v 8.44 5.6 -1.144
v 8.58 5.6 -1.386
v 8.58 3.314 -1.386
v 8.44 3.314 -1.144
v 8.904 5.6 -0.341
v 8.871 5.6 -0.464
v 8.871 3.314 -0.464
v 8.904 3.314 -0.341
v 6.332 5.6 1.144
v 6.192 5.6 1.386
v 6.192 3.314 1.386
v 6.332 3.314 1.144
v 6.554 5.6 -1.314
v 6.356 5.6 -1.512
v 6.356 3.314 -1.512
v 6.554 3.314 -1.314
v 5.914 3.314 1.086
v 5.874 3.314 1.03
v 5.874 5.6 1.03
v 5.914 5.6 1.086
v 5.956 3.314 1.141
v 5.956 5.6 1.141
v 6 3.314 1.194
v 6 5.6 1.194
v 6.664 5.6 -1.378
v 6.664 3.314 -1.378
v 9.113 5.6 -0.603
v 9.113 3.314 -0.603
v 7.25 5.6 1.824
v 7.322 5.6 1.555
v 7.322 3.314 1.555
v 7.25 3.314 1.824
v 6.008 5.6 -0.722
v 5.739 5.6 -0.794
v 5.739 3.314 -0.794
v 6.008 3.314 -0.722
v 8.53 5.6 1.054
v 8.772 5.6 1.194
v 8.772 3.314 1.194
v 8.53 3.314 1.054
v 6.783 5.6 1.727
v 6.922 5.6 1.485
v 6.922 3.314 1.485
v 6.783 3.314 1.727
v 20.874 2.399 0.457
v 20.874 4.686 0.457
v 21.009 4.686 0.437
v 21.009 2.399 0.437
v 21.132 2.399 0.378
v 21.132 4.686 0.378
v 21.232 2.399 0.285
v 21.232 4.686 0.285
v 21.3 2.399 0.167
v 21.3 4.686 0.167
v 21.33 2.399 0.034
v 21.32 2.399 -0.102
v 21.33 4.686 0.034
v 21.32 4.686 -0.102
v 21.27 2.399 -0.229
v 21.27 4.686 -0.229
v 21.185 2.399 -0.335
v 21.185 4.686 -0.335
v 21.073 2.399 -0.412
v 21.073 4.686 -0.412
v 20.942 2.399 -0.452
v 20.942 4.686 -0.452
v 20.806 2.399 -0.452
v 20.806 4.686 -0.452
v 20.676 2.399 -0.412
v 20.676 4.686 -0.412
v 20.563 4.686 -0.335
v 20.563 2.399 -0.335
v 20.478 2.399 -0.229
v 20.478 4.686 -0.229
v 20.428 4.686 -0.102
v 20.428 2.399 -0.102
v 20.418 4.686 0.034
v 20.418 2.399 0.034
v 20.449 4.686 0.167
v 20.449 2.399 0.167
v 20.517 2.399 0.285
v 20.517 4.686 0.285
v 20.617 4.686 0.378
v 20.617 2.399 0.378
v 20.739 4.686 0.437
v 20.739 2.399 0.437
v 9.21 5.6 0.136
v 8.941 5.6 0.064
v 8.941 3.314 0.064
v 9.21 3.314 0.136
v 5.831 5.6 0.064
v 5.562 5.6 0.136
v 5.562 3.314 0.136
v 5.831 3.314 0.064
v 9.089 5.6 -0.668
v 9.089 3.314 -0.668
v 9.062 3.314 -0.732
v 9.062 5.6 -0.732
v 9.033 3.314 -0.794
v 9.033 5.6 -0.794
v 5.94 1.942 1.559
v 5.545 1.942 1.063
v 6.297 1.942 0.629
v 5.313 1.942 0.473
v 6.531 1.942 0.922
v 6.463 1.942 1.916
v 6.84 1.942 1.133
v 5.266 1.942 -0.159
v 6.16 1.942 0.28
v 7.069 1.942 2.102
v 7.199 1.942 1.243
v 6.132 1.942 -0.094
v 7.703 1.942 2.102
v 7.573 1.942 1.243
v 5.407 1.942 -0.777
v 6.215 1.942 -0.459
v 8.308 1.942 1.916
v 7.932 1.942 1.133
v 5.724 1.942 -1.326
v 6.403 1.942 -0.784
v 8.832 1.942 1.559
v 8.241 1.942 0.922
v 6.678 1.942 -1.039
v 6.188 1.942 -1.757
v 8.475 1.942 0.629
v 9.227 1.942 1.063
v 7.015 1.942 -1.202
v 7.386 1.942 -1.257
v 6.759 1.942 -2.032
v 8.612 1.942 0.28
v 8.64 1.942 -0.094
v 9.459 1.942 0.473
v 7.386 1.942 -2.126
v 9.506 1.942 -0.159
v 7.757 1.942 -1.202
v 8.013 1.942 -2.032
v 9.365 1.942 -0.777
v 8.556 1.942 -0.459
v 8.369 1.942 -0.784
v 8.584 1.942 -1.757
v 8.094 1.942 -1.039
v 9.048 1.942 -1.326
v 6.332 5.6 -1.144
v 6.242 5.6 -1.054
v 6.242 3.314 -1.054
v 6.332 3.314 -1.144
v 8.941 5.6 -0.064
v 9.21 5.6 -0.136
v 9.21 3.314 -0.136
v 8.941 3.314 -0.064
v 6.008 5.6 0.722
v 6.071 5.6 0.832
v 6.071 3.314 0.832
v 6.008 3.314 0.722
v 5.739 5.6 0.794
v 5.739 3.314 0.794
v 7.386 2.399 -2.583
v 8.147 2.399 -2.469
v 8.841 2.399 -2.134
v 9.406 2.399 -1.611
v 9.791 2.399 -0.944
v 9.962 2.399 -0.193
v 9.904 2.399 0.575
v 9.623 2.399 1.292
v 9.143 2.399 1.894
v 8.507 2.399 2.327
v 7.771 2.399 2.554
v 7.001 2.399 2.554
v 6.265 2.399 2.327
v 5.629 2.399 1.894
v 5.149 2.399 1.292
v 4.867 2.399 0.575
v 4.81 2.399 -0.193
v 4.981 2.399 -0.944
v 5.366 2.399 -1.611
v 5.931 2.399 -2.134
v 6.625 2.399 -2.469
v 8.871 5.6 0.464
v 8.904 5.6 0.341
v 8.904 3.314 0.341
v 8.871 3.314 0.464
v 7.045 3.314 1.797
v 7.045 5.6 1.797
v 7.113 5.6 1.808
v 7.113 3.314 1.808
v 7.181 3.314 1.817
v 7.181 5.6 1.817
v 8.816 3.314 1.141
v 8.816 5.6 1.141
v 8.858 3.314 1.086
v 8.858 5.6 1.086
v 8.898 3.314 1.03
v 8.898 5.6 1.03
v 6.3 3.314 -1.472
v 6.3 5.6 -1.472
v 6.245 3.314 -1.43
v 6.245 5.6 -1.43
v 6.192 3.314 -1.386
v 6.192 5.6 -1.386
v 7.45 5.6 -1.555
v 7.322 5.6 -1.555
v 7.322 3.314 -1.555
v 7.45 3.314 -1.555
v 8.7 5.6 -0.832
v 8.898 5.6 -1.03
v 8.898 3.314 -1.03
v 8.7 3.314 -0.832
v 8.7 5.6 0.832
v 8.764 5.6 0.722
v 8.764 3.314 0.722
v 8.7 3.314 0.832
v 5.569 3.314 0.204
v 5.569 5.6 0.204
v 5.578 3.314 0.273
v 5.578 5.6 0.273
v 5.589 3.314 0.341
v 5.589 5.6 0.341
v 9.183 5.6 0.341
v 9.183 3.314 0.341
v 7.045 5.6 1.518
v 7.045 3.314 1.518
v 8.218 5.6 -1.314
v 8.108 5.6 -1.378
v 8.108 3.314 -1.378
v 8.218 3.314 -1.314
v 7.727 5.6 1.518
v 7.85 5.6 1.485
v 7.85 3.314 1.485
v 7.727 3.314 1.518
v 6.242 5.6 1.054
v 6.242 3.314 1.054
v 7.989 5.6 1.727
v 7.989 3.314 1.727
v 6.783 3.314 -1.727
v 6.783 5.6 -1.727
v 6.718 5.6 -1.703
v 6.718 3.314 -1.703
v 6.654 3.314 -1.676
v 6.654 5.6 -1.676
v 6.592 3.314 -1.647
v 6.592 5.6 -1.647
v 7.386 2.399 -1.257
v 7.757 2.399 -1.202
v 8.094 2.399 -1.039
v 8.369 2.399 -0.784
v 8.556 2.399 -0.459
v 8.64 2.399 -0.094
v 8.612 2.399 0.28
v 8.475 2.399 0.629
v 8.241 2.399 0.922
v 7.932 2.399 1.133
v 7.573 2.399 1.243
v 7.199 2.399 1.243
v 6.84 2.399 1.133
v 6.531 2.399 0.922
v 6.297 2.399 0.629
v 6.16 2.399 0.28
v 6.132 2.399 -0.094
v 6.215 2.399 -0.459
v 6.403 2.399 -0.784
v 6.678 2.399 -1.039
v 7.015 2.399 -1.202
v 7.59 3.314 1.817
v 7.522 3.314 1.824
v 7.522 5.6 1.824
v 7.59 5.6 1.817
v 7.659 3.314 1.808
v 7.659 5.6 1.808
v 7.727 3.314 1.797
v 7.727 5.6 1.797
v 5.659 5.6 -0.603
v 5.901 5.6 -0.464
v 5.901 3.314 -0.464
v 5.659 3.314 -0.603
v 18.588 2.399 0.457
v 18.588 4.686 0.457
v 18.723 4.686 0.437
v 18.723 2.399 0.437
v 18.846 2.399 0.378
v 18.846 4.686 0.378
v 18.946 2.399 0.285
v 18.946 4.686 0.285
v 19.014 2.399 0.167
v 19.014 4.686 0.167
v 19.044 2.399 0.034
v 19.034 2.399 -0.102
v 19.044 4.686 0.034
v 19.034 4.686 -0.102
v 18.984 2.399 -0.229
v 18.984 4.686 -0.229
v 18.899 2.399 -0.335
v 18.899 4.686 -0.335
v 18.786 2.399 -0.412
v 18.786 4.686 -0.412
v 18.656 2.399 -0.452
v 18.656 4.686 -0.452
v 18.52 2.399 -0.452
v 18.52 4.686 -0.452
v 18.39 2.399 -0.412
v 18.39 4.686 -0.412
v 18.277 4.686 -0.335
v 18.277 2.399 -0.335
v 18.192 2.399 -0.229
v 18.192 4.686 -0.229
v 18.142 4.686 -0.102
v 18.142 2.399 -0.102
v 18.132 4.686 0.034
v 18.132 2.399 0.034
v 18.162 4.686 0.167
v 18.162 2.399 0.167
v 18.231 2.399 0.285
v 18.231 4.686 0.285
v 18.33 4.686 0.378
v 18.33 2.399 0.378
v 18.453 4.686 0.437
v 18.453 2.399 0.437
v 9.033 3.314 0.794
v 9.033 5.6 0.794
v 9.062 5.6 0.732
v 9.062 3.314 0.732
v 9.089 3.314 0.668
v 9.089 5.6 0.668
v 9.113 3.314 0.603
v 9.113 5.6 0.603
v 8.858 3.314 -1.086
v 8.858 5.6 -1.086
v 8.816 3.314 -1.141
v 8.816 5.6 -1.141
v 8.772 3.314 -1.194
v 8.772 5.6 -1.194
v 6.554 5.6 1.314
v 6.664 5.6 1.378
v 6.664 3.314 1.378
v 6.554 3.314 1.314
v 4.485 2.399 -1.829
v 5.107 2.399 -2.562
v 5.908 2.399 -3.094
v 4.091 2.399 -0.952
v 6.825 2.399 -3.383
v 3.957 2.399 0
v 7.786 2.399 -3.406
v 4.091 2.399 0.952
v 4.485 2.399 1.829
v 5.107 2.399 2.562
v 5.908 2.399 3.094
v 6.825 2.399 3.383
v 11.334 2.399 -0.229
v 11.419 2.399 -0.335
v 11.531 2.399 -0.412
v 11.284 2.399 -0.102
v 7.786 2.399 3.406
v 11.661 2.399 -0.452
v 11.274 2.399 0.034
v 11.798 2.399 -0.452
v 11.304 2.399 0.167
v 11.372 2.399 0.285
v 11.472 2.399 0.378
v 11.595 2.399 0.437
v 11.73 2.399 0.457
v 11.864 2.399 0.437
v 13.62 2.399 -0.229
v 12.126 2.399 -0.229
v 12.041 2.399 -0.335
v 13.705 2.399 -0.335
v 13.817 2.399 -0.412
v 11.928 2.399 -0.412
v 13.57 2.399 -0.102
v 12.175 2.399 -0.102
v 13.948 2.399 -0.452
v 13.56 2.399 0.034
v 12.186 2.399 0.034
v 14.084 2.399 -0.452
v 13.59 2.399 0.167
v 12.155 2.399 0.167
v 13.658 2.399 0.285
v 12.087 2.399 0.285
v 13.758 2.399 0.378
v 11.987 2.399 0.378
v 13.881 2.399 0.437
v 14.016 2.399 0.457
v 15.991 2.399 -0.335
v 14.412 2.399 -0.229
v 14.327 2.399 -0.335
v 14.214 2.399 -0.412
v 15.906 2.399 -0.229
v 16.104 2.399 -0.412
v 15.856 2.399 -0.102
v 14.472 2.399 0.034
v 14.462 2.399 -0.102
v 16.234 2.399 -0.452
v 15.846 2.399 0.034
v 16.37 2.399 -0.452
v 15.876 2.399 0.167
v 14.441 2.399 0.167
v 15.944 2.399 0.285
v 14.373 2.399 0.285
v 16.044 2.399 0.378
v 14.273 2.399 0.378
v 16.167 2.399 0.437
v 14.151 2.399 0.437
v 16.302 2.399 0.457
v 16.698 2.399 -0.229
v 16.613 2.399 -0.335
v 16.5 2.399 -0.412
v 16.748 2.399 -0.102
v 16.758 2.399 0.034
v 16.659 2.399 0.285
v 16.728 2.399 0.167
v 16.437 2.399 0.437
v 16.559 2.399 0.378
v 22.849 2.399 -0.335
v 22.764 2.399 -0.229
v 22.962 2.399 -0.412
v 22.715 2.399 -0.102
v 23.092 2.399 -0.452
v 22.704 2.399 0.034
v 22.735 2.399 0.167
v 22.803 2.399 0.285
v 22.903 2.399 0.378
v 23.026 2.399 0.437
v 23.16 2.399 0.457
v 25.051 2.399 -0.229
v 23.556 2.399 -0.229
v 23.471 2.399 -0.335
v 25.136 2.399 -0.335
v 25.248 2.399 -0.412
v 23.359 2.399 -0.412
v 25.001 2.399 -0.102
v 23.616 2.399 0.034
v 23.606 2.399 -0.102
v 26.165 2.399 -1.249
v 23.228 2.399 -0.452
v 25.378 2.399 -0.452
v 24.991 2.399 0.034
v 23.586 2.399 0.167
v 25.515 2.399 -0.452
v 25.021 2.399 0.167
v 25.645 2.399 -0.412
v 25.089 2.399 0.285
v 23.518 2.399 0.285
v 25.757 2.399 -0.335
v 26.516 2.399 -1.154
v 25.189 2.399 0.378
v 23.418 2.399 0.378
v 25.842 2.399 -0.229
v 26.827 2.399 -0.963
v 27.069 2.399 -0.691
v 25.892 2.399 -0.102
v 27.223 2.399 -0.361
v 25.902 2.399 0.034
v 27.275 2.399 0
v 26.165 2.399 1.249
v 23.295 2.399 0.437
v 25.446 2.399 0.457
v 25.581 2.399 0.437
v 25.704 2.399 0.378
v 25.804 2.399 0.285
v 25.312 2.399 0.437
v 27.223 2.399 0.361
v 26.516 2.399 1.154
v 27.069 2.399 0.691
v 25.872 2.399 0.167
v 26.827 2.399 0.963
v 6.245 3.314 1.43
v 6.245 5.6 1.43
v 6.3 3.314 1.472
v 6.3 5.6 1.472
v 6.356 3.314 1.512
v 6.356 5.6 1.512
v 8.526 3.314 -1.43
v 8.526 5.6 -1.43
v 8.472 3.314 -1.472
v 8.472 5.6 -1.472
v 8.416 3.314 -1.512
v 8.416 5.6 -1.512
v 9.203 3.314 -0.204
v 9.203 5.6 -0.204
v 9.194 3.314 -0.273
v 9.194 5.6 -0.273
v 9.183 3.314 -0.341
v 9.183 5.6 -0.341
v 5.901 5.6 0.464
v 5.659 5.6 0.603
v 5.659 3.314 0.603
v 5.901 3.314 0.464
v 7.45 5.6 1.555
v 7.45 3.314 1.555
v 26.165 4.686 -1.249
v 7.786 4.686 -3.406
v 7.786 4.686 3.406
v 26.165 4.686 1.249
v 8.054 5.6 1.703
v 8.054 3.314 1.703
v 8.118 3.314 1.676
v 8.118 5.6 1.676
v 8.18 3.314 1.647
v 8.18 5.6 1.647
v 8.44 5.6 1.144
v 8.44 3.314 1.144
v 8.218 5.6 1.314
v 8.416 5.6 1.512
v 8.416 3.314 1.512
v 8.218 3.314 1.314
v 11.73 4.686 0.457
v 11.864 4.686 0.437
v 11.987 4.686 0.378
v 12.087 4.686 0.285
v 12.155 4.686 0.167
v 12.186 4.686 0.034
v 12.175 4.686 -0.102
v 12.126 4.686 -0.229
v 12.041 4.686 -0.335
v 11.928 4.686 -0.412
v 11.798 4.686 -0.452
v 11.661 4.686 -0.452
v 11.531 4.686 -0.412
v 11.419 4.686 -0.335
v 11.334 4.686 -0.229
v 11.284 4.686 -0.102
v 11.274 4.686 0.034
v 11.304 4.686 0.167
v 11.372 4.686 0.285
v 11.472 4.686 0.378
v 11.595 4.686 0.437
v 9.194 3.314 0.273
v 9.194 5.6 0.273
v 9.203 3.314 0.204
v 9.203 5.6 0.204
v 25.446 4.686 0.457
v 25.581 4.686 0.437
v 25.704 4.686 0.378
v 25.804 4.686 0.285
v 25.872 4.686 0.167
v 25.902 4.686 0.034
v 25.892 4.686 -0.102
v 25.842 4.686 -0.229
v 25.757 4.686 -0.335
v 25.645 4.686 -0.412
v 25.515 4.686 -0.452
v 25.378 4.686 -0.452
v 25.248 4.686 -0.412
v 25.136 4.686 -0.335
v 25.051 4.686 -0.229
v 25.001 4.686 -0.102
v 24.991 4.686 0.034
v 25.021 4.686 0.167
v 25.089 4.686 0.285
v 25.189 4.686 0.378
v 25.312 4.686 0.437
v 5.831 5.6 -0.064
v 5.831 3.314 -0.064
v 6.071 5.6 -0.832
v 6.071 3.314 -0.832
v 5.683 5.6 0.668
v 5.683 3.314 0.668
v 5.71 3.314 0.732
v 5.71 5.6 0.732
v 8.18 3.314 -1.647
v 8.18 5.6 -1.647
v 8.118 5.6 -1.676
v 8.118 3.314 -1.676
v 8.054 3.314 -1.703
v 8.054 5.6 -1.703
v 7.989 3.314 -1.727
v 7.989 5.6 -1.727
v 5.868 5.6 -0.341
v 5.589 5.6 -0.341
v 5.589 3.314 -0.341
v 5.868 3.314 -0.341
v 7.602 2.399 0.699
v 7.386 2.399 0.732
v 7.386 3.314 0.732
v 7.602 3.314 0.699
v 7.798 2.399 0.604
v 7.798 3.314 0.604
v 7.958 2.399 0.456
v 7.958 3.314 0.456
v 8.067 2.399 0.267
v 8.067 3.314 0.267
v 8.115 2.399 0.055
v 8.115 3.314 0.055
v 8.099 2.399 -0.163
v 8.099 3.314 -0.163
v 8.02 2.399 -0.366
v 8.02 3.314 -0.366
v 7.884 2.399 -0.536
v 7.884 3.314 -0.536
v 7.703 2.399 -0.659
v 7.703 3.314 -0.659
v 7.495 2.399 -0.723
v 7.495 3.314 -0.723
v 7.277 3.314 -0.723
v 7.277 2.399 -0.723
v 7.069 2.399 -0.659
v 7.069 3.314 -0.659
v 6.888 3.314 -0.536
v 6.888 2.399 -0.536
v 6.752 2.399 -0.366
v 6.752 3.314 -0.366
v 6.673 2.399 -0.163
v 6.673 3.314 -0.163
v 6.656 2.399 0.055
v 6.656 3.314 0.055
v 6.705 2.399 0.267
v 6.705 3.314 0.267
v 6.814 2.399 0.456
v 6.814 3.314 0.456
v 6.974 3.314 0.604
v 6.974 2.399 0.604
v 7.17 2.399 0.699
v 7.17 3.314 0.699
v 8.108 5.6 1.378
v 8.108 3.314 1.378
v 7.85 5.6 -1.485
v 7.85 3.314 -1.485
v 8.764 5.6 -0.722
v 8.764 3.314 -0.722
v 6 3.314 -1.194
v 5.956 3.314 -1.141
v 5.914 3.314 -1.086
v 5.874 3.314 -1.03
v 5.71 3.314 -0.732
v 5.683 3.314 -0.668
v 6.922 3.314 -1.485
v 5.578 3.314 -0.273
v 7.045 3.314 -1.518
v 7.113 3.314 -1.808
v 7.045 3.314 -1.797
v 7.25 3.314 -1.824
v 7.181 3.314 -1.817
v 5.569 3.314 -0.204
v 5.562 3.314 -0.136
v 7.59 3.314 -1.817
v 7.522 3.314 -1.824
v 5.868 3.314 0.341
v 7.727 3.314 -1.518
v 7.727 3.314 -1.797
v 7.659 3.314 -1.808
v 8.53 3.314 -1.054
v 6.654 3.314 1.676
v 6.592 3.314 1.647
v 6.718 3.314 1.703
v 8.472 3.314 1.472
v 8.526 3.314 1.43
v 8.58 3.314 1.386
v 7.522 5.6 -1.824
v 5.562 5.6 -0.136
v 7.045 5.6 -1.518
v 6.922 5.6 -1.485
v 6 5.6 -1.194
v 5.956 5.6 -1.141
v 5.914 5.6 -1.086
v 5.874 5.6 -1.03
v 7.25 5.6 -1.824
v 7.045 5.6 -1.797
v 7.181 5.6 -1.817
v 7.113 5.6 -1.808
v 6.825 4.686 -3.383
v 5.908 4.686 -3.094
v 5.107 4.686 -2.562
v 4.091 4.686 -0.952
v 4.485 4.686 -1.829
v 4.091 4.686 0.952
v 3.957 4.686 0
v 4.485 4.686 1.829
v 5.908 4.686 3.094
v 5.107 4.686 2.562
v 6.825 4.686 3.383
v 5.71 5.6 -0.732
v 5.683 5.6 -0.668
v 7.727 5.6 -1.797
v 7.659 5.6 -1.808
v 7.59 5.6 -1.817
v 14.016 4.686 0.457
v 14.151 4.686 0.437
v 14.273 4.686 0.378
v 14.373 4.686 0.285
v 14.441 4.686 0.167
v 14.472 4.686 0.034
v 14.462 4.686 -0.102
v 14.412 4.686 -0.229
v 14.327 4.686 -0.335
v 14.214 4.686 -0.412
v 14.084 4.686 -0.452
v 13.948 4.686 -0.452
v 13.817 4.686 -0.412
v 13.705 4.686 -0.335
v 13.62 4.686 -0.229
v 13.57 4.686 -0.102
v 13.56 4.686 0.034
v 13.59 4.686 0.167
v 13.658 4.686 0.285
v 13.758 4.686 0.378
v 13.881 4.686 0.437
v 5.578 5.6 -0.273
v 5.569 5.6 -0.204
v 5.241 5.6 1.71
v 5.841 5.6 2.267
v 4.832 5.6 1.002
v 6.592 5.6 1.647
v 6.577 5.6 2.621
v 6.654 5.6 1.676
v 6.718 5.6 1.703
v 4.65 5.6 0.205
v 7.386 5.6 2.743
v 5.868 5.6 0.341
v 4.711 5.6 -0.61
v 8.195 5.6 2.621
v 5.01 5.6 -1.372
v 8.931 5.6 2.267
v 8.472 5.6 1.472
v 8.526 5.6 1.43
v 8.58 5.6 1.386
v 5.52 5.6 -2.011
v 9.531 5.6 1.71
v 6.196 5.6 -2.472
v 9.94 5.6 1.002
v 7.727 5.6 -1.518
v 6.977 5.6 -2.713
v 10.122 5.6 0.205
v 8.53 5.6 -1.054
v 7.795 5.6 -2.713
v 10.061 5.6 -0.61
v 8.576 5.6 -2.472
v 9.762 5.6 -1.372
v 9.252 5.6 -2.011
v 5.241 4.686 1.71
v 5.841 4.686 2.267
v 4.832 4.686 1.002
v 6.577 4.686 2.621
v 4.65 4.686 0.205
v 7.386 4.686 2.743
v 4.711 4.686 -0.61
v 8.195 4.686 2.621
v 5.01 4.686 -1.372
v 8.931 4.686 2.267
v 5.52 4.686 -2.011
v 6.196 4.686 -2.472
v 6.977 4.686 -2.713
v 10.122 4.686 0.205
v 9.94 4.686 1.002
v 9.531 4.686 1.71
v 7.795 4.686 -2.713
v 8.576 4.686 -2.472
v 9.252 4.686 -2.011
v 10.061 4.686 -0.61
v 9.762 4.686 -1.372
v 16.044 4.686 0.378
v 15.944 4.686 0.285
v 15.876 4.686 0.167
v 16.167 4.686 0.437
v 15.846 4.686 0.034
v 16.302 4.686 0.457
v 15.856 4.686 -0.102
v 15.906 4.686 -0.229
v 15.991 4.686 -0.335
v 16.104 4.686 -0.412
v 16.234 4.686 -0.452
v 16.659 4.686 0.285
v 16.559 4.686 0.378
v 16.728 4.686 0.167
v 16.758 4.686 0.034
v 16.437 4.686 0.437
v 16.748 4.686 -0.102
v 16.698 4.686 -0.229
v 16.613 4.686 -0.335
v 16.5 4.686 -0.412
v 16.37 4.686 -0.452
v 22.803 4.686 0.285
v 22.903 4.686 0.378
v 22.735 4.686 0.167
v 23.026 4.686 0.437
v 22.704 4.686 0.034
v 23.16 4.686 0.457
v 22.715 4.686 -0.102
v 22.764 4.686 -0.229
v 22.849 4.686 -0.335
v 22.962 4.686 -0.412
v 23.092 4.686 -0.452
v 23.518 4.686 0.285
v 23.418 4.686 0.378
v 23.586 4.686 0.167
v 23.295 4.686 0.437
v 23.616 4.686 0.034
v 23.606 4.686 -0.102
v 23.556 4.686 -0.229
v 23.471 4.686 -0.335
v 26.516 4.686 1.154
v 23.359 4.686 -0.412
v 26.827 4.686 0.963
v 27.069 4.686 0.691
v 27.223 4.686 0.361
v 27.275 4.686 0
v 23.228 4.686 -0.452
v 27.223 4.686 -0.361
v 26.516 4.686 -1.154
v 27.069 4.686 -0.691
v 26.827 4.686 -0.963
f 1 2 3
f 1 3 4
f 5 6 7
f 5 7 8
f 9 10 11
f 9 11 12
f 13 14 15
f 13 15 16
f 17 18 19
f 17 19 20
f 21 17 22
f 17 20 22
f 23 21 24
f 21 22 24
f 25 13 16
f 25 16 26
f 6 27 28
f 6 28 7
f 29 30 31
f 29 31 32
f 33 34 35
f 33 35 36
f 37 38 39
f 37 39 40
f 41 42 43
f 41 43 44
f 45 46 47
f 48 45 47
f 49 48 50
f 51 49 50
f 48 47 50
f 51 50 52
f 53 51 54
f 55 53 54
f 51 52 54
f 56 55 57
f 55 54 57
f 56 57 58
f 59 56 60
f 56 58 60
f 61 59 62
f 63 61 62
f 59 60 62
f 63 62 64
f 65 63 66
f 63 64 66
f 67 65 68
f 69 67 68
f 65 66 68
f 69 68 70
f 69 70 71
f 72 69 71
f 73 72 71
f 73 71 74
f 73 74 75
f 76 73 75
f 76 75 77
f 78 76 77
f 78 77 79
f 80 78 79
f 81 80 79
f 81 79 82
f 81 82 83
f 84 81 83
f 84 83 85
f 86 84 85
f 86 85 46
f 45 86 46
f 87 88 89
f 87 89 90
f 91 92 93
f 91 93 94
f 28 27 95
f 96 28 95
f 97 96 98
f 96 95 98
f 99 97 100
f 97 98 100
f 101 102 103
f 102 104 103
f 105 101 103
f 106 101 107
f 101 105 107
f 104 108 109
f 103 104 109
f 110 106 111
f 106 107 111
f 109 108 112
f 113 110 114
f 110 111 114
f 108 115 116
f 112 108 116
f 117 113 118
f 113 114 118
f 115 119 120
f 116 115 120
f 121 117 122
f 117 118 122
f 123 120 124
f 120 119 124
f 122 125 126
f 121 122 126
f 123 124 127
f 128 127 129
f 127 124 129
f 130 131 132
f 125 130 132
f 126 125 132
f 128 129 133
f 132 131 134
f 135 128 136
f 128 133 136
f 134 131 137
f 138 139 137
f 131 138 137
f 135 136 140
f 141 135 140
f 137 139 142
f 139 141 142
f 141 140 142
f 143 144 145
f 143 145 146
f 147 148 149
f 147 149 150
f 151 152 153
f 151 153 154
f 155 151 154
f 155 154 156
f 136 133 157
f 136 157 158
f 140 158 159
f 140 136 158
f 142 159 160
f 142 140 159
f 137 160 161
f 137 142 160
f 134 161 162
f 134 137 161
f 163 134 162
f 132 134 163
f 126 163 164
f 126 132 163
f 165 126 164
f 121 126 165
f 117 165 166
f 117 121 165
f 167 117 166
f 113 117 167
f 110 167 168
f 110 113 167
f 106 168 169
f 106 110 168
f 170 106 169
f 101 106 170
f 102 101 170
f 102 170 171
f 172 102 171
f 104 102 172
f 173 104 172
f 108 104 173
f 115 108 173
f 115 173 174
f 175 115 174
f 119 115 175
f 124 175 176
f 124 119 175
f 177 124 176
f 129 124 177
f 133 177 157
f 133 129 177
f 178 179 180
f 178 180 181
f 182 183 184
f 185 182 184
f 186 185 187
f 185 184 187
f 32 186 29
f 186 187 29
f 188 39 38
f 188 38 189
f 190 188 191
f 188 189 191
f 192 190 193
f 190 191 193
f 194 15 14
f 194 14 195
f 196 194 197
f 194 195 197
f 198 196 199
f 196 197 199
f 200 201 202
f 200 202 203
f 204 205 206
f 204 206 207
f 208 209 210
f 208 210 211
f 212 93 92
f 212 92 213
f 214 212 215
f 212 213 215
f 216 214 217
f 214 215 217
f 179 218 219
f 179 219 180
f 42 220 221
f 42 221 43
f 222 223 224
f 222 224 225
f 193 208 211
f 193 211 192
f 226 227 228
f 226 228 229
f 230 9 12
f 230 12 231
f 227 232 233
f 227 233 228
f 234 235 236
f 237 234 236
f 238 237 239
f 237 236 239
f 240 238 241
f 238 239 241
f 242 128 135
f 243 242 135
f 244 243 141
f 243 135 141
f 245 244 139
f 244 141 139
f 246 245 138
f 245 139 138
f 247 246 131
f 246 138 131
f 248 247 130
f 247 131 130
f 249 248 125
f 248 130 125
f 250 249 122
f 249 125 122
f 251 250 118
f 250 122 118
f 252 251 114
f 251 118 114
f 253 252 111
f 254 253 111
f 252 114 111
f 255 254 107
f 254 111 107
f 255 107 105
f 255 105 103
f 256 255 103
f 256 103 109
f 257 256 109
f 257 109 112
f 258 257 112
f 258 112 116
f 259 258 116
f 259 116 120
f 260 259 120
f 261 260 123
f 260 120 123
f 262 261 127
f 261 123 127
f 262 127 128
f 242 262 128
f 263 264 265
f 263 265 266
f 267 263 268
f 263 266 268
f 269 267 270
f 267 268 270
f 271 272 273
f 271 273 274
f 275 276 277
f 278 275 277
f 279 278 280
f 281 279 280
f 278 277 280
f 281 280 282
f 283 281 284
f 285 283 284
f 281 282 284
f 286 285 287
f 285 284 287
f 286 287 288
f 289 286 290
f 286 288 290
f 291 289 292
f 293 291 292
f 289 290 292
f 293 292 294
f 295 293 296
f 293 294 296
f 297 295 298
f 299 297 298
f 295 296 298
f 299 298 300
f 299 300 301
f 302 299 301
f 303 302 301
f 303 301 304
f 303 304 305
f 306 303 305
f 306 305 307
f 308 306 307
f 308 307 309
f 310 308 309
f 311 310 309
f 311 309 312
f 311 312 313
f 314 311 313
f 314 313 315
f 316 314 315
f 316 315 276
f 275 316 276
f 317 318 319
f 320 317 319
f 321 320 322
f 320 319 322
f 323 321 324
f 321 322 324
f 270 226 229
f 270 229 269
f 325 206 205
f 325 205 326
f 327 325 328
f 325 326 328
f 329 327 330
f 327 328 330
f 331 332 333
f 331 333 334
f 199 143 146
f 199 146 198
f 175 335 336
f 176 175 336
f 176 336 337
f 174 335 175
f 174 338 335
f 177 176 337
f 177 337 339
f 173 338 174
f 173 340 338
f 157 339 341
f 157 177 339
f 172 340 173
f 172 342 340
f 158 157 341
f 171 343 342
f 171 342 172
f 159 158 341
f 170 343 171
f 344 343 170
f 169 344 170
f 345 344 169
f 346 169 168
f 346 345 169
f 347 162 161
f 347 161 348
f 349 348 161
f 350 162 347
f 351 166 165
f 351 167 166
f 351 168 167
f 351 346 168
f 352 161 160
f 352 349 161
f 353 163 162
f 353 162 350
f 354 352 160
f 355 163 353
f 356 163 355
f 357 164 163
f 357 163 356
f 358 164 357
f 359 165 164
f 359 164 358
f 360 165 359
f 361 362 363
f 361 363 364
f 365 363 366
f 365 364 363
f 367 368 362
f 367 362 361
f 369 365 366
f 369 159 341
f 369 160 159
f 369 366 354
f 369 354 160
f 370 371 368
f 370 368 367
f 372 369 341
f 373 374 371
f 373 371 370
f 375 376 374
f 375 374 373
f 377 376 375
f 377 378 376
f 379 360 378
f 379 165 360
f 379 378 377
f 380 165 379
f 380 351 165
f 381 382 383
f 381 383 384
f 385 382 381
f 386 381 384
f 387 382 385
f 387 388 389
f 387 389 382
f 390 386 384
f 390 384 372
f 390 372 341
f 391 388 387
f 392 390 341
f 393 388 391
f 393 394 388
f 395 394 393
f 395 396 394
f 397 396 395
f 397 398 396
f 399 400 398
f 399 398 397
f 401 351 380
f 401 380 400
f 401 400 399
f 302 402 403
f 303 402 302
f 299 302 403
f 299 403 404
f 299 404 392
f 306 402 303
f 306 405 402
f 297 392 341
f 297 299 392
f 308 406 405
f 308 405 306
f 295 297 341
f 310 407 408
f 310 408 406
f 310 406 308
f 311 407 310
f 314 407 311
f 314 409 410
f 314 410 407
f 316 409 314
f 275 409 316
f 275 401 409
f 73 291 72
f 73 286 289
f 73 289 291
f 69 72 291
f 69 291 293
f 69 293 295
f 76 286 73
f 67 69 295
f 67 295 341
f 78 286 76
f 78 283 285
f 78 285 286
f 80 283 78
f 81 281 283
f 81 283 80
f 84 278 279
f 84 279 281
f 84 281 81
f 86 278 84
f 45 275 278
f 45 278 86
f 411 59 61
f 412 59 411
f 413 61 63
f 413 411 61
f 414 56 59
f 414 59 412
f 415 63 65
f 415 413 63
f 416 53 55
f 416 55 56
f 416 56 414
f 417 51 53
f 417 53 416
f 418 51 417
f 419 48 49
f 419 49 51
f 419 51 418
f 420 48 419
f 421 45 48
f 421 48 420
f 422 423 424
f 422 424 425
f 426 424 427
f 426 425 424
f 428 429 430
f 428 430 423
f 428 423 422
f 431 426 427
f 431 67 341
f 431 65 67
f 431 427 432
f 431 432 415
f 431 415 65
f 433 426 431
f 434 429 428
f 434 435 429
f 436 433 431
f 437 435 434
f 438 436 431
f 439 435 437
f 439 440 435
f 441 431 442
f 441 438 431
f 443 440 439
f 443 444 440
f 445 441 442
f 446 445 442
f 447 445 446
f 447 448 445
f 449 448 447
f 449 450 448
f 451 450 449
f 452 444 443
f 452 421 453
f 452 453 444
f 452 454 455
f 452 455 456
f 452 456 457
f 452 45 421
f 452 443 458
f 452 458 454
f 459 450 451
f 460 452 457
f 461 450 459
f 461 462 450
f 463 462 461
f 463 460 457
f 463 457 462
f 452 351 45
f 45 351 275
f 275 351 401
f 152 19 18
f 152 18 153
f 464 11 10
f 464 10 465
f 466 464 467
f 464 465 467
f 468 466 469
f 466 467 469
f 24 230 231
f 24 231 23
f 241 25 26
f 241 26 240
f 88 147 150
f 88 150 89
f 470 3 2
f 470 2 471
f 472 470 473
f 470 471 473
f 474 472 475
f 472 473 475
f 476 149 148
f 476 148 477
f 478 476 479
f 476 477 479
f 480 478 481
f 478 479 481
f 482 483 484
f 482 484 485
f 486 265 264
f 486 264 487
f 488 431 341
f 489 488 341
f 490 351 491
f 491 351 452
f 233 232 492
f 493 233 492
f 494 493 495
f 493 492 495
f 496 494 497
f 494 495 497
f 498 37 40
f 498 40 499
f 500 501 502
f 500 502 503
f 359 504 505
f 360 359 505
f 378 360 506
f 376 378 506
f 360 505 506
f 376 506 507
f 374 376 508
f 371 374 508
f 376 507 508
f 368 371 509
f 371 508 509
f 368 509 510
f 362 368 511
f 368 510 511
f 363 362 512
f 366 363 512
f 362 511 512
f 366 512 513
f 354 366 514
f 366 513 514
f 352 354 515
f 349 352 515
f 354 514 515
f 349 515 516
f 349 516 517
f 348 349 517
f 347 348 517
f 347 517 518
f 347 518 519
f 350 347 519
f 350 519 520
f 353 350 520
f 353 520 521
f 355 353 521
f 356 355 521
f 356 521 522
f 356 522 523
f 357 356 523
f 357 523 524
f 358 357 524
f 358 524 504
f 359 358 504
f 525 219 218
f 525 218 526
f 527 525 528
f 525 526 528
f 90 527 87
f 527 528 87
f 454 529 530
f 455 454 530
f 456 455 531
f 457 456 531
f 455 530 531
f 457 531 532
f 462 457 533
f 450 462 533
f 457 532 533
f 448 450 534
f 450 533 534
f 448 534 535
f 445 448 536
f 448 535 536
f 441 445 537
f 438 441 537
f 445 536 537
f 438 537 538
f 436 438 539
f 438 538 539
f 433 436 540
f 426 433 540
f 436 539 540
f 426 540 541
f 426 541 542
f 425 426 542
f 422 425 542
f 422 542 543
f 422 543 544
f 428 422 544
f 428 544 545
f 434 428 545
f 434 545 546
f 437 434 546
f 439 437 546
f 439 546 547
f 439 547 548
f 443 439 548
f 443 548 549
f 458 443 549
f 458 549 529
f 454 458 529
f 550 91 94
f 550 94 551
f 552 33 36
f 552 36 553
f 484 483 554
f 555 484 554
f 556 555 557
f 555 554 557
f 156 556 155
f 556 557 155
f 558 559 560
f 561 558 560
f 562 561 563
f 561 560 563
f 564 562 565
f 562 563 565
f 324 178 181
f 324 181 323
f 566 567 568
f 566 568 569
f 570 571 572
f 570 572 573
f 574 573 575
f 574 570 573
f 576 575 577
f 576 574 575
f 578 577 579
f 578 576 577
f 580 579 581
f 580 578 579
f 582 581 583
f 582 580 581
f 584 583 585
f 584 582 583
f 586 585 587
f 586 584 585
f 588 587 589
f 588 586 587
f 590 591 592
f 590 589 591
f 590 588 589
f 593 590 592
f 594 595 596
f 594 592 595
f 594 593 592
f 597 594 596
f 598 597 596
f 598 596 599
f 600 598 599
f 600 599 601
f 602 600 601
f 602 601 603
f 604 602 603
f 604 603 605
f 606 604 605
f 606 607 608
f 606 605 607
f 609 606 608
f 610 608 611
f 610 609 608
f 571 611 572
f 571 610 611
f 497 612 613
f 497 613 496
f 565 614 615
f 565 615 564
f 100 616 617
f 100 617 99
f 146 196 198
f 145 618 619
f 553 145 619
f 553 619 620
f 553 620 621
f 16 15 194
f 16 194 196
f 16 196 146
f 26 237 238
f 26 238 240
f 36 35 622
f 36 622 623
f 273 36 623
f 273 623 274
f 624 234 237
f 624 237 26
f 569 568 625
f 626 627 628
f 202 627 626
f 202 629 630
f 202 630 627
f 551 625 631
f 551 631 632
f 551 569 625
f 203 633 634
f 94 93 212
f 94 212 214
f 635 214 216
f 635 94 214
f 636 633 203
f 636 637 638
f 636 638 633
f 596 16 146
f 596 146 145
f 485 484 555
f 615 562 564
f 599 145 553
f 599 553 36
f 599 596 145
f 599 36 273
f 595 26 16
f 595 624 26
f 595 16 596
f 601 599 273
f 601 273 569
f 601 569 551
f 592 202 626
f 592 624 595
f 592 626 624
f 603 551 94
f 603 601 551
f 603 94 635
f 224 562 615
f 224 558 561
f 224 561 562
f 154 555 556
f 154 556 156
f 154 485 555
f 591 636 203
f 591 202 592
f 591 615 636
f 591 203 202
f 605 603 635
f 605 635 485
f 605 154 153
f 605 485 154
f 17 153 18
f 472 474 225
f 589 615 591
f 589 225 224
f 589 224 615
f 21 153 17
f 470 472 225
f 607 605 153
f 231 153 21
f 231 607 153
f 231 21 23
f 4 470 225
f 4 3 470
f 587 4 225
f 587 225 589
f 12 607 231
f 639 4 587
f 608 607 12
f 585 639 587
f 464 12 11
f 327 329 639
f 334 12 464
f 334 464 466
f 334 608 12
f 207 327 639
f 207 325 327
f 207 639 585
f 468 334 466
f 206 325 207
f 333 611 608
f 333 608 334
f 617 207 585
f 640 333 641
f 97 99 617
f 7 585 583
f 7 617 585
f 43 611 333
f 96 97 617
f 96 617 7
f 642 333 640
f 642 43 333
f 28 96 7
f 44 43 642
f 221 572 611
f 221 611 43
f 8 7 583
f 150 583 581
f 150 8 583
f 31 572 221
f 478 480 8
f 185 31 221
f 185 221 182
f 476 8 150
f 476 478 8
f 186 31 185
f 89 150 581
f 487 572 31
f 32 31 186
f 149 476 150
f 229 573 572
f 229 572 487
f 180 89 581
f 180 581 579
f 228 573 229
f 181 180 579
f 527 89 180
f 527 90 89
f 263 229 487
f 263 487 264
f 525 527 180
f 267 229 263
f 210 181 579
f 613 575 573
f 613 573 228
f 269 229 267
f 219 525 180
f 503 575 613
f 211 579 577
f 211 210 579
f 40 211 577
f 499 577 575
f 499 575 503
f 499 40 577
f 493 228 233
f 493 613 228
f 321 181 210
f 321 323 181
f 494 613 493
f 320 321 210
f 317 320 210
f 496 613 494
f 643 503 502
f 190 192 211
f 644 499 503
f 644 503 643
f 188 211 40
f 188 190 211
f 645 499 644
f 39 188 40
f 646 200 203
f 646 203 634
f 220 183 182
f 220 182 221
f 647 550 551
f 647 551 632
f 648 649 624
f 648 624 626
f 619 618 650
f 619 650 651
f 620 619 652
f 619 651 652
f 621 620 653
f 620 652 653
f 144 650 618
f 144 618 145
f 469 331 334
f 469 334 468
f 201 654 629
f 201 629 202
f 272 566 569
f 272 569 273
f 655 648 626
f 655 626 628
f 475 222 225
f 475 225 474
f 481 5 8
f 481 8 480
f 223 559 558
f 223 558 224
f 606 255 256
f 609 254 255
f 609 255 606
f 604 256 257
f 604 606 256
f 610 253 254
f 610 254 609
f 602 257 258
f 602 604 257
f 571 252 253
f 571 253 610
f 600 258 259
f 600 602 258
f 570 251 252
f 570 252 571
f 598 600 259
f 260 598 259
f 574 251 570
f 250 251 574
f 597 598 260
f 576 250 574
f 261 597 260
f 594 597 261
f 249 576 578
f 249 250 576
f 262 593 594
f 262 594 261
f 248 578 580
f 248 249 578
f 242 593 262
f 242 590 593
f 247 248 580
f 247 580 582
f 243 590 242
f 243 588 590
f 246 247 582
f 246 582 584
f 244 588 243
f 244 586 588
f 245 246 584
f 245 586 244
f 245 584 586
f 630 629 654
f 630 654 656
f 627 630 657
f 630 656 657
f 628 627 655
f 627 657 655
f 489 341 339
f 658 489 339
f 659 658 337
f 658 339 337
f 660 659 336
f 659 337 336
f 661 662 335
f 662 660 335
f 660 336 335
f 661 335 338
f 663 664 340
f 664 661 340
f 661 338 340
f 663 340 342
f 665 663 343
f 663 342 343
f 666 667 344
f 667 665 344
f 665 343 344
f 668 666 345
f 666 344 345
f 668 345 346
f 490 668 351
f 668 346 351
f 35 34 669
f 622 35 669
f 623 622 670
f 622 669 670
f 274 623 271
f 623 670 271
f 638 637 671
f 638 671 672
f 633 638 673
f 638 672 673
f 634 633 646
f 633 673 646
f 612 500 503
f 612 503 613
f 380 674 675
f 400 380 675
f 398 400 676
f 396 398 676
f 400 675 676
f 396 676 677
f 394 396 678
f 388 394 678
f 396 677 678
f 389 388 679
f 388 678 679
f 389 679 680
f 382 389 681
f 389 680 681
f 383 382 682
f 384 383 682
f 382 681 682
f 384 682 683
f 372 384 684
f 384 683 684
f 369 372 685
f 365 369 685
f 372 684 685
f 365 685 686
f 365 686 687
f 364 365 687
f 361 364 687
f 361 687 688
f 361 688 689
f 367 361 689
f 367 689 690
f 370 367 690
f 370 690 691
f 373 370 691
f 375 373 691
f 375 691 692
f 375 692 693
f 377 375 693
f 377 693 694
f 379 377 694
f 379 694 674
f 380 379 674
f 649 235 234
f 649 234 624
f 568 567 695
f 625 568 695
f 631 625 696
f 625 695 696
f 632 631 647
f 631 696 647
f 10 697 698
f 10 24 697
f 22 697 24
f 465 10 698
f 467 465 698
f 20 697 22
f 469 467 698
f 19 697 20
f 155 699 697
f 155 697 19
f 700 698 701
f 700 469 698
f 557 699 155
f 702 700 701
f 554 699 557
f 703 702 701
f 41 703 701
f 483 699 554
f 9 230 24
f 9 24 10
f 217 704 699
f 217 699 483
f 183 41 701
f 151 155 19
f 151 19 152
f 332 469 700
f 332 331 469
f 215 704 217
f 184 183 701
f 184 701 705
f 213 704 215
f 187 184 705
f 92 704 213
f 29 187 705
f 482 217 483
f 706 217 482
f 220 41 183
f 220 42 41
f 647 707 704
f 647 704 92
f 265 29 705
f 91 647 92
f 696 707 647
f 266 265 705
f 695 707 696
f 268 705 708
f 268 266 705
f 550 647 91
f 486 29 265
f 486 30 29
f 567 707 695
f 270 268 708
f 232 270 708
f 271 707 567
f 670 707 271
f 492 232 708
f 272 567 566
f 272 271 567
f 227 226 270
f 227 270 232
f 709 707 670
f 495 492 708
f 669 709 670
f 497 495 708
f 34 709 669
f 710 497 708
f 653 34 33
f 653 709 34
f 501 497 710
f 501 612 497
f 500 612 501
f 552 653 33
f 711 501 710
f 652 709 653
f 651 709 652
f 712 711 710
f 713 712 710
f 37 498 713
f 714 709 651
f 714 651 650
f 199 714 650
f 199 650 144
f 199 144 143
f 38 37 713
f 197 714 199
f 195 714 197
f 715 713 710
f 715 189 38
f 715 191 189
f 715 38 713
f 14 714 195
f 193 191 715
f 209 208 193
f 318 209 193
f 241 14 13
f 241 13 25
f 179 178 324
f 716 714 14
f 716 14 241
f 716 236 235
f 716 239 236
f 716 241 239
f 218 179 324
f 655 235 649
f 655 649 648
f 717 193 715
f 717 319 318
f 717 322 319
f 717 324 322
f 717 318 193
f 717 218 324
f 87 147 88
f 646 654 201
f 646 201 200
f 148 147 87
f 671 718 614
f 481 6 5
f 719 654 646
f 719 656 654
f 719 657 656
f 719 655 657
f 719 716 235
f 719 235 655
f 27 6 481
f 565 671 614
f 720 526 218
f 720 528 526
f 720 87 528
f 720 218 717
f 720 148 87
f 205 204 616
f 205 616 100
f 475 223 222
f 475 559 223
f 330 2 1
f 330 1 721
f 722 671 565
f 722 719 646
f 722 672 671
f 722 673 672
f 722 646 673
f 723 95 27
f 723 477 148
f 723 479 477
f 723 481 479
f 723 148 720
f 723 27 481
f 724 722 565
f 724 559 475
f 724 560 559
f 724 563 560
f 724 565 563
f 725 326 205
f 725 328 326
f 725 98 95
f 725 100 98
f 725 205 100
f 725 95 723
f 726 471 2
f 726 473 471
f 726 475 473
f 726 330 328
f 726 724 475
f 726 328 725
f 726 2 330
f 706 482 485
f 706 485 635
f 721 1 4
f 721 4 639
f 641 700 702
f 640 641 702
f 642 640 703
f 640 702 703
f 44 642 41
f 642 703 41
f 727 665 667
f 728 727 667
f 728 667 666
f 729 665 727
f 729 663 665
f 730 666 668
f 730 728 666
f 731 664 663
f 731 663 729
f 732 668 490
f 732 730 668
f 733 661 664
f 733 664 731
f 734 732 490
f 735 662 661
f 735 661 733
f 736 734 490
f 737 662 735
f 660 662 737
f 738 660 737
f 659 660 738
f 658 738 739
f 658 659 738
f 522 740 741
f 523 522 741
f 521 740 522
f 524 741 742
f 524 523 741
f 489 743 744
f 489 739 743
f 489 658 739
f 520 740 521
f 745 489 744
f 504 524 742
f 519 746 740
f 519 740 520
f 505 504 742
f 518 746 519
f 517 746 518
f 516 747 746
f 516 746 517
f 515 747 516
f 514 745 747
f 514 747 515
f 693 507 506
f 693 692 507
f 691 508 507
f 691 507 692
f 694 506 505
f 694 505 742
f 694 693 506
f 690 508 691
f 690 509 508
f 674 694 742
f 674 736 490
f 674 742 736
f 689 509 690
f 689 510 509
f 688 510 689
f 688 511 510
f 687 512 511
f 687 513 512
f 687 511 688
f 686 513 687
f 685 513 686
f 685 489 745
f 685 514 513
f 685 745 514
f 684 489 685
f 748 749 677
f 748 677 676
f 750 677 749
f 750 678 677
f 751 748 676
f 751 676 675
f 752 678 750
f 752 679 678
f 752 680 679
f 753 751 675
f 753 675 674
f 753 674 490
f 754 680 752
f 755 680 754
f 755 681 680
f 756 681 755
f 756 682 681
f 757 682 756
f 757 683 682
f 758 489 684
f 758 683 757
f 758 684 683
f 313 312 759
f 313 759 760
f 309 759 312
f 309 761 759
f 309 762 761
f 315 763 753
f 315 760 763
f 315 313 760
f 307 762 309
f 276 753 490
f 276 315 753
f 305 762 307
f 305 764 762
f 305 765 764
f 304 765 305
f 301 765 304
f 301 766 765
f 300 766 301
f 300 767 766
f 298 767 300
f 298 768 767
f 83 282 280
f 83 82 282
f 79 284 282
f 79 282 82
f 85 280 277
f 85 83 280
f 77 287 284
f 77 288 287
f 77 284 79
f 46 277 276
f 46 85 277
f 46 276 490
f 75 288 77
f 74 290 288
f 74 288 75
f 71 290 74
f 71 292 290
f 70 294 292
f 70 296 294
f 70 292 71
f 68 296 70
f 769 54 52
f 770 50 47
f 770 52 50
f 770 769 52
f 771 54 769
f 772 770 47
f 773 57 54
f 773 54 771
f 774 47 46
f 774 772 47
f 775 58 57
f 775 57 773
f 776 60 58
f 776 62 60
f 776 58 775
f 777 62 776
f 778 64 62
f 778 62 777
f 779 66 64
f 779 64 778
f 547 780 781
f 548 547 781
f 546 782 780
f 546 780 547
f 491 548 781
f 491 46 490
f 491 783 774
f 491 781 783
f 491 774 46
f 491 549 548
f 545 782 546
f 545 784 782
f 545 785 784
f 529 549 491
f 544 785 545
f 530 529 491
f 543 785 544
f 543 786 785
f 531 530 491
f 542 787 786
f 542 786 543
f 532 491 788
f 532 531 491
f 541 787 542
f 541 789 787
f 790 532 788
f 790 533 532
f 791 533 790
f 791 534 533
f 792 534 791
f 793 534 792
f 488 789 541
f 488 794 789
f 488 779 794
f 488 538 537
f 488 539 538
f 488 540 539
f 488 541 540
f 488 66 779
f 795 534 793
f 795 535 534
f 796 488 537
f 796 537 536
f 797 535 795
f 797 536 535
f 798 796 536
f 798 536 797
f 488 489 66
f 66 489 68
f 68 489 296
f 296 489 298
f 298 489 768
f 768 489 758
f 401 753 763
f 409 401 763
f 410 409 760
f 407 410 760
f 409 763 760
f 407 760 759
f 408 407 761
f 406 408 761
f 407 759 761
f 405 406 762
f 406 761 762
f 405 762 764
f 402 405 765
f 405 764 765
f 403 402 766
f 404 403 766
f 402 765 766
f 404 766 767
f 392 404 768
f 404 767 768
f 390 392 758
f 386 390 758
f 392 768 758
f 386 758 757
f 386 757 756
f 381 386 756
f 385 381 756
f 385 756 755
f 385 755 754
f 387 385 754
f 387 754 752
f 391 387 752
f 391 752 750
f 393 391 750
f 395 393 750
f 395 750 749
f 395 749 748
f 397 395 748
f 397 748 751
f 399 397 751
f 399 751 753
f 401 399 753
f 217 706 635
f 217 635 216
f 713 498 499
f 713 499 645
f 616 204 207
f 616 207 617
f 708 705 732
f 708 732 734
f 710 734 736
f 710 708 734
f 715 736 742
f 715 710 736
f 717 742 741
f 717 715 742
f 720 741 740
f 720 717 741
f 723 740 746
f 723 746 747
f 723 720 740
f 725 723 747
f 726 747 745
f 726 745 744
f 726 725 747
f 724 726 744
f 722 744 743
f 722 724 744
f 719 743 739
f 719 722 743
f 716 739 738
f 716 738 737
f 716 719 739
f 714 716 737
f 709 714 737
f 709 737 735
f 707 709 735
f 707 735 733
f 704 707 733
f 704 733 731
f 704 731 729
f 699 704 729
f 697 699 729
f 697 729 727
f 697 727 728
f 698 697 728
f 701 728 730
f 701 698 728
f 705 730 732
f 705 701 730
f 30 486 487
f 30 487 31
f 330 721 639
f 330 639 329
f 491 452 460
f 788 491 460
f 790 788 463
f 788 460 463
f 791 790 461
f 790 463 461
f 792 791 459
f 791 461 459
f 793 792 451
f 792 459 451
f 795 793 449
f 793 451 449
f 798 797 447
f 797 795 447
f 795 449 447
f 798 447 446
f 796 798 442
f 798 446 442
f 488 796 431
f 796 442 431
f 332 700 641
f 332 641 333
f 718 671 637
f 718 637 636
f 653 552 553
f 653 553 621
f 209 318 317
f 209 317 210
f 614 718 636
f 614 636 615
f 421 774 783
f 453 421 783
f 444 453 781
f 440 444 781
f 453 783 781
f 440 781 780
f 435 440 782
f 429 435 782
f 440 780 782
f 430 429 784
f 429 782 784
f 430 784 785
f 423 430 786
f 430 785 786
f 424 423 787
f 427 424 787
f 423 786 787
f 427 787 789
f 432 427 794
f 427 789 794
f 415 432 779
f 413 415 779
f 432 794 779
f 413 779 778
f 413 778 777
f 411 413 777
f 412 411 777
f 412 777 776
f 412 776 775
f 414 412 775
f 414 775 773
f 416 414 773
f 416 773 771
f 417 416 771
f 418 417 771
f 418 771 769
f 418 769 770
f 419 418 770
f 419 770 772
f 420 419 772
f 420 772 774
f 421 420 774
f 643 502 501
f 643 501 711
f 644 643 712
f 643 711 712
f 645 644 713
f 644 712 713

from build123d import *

# Parameters (mm, degrees)
ESQUISSE1_R                  = 1.6
BOSS_EXTRU_1_DEPTH           = 8
ESQUISSE2_R                  = 1
ENL_V_MAT_EXTRU_1_DEPTH      = 8
R_P_TITION_LIN_AIRE1_COUNT   = 7
R_P_TITION_LIN_AIRE1_PITCH   = 5
ESQUISSE3_W                  = 63.02569825
ESQUISSE3_H                  = 22.447508966
ESQUISSE3_R                  = 6
ENL_V_MAT_EXTRU_2_DEPTH      = 2
ESQUISSE4_W                  = 65.150237544
ESQUISSE4_H                  = 23.585889013
ESQUISSE4_R                  = 4.65
ENL_V_MAT_EXTRU_3_DEPTH      = 1
ESQUISSE5_R                  = 2.75
ENL_V_MAT_EXTRU_4_DEPTH      = 1
CHANFREIN1_SIZE              = 1
ESQUISSE6_R                  = 4
ENL_V_MAT_EXTRU_5_DEPTH      = 5
BOSS_EXTRU_2_DEPTH           = 5
R_P_TITION_CIRCULAIRE1_COUNT = 24
ESCALA2_SCALE                = 0.7
ESCALA5_SCALE                = 0.8
ESCALA6_SCALE                = 0.9
ESCALA7_SCALE                = 0.9
ESCALA8_SCALE                = 1.05
ESCALA9_SCALE                = 1.2
ESCALA11_SCALE               = 0.8


with BuildPart() as part:
    # Esquisse1 → Boss.-Extru.1 (new body)
    with BuildSketch(Plane(origin=(0, 0, 0), x_dir=(1, 0, 0), z_dir=(0, 1, 0))):
        with BuildLine():
            Line((0.874233129, -7.448873501), (41.070552147, -2.731253617))
            ThreePointArc((41.070552147, -2.731253617), (43.5, 0), (41.070552147, 2.731253617))
            Line((41.070552147, 2.731253617), (0.874233129, 7.448873501))
            ThreePointArc((0.874233129, 7.448873501), (-7.5, 0), (0.874233129, -7.448873501))
        make_face()
        with Locations(Location((0, 0, 0), (0, 0, 270))):
            Circle(ESQUISSE1_R, mode=Mode.SUBTRACT)
    extrude(amount=BOSS_EXTRU_1_DEPTH)

    # Esquisse2 → Enlèv. mat.-Extru.1 (cut)
    with BuildSketch(Plane(origin=(0, 8, 0), x_dir=(1, 0, 0), z_dir=(0, 1, 0))):
        with Locations(Location((9.5, 0, 0), (0, 0, 270))):
            Circle(ESQUISSE2_R)
    enl_v_mat_extru_1 = extrude(amount=-ENL_V_MAT_EXTRU_1_DEPTH, mode=Mode.SUBTRACT)

    # Répétition linéaire1: Enlèv. mat.-Extru.1 ×7
    with Locations(*[(i * R_P_TITION_LIN_AIRE1_PITCH, 0, 0) for i in range(1, R_P_TITION_LIN_AIRE1_COUNT)]):
        add(enl_v_mat_extru_1, mode=Mode.SUBTRACT)

    # Esquisse3 → Enlèv. mat.-Extru.2 (cut)
    with BuildSketch(Plane(origin=(0, 8, 0), x_dir=(1, 0, 0), z_dir=(0, 1, 0))):
        with Locations((18.729808022, -1.006570064)):
            Rectangle(ESQUISSE3_W, ESQUISSE3_H)
        with Locations(Location((0, 0, 0), (0, 0, 270))):
            Circle(ESQUISSE3_R, mode=Mode.SUBTRACT)
    extrude(amount=-ENL_V_MAT_EXTRU_2_DEPTH, mode=Mode.SUBTRACT)

    # Esquisse4 → Enlèv. mat.-Extru.3 (cut)
    with BuildSketch(Plane.XZ):
        with Locations((19.098187779, 0.565848797)):
            Rectangle(ESQUISSE4_W, ESQUISSE4_H)
        with Locations(Location((0, 0, 0), (0, 0, 270))):
            Circle(ESQUISSE4_R, mode=Mode.SUBTRACT)
    extrude(amount=-ENL_V_MAT_EXTRU_3_DEPTH, mode=Mode.SUBTRACT)

    # Esquisse5 → Enlèv. mat.-Extru.4 (cut)
    with BuildSketch(Plane.XZ):
        with Locations(Location((0, 0, 0), (0, 0, 270))):
            Circle(ESQUISSE5_R)
    extrude(amount=-ENL_V_MAT_EXTRU_4_DEPTH, mode=Mode.SUBTRACT)

    # Chanfrein1
    chanfrein1_edges = [part.edges().sort_by_distance(p)[0] for p in [
        (0, 1, 4.65),
    ]]
    chamfer(chanfrein1_edges, length=CHANFREIN1_SIZE - 0.0001)  # a hair under: the kernel refuses the full size

    # Esquisse6 → Enlèv. mat.-Extru.5 (cut)
    with BuildSketch(Plane(origin=(0, 8, 0), x_dir=(1, 0, 0), z_dir=(0, 1, 0))):
        with Locations(Location((0, 0, 0), (0, 0, 270))):
            Circle(ESQUISSE6_R)
    extrude(amount=-ENL_V_MAT_EXTRU_5_DEPTH, mode=Mode.SUBTRACT)

    # Esquisse7 → Boss.-Extru.2 (add)
    with BuildSketch(Plane(origin=(0, 8, 0), x_dir=(1, 0, 0), z_dir=(0, 1, 0))):
        Polygon((0.3, -4), (0.139230485, -3.4), (-0.139230485, -3.4), (-0.3, -4), align=None)
    boss_extru_2 = extrude(amount=-BOSS_EXTRU_2_DEPTH)

    # Répétition circulaire1: Boss.-Extru.2 ×24 about axis
    r_p_tition_circulaire1_axis = Axis((0, 0, 0), (0, 1, 0))
    for i in range(1, R_P_TITION_CIRCULAIRE1_COUNT):
        add(boss_extru_2.rotate(r_p_tition_circulaire1_axis, i * 360 / R_P_TITION_CIRCULAIRE1_COUNT))


with BuildPart() as part_1:
    # Escala2: scaled about (13.607866543, 3.578266839, 0)
    add(part.part.scale(ESCALA2_SCALE).moved(Location((4.082359963, 1.073480052, 0))))


with BuildPart() as part_2:
    # Escala5: scaled about (13.607866543, 3.578266839, 0)
    add(part_1.part.scale(ESCALA5_SCALE).moved(Location((2.721573309, 0.715653368, 0))))


with BuildPart() as part_3:
    # Escala6: scaled about (13.607866543, 3.578266839, 0)
    add(part_2.part.scale(ESCALA6_SCALE).moved(Location((1.360786654, 0.357826684, 0))))


with BuildPart() as part_4:
    # Escala7: scaled about (13.607866543, 3.578266839, 0)
    add(part_3.part.scale(ESCALA7_SCALE).moved(Location((1.360786654, 0.357826684, 0))))


with BuildPart() as part_5:
    # Escala8: scaled about (13.607866543, 3.578266839, 0)
    add(part_4.part.scale(ESCALA8_SCALE).moved(Location((-0.680393327, -0.178913342, 0))))


with BuildPart() as part_6:
    # Escala9: scaled about (13.607866543, 3.578266839, 0)
    add(part_5.part.scale(ESCALA9_SCALE).moved(Location((-2.721573309, -0.715653368, 0))))


with BuildPart() as part_7:
    # Escala11: scaled about (13.607866543, 3.578266839, 0)
    add(part_6.part.scale(ESCALA11_SCALE).moved(Location((2.721573309, 0.715653368, 0))))


solid = part_7.part
